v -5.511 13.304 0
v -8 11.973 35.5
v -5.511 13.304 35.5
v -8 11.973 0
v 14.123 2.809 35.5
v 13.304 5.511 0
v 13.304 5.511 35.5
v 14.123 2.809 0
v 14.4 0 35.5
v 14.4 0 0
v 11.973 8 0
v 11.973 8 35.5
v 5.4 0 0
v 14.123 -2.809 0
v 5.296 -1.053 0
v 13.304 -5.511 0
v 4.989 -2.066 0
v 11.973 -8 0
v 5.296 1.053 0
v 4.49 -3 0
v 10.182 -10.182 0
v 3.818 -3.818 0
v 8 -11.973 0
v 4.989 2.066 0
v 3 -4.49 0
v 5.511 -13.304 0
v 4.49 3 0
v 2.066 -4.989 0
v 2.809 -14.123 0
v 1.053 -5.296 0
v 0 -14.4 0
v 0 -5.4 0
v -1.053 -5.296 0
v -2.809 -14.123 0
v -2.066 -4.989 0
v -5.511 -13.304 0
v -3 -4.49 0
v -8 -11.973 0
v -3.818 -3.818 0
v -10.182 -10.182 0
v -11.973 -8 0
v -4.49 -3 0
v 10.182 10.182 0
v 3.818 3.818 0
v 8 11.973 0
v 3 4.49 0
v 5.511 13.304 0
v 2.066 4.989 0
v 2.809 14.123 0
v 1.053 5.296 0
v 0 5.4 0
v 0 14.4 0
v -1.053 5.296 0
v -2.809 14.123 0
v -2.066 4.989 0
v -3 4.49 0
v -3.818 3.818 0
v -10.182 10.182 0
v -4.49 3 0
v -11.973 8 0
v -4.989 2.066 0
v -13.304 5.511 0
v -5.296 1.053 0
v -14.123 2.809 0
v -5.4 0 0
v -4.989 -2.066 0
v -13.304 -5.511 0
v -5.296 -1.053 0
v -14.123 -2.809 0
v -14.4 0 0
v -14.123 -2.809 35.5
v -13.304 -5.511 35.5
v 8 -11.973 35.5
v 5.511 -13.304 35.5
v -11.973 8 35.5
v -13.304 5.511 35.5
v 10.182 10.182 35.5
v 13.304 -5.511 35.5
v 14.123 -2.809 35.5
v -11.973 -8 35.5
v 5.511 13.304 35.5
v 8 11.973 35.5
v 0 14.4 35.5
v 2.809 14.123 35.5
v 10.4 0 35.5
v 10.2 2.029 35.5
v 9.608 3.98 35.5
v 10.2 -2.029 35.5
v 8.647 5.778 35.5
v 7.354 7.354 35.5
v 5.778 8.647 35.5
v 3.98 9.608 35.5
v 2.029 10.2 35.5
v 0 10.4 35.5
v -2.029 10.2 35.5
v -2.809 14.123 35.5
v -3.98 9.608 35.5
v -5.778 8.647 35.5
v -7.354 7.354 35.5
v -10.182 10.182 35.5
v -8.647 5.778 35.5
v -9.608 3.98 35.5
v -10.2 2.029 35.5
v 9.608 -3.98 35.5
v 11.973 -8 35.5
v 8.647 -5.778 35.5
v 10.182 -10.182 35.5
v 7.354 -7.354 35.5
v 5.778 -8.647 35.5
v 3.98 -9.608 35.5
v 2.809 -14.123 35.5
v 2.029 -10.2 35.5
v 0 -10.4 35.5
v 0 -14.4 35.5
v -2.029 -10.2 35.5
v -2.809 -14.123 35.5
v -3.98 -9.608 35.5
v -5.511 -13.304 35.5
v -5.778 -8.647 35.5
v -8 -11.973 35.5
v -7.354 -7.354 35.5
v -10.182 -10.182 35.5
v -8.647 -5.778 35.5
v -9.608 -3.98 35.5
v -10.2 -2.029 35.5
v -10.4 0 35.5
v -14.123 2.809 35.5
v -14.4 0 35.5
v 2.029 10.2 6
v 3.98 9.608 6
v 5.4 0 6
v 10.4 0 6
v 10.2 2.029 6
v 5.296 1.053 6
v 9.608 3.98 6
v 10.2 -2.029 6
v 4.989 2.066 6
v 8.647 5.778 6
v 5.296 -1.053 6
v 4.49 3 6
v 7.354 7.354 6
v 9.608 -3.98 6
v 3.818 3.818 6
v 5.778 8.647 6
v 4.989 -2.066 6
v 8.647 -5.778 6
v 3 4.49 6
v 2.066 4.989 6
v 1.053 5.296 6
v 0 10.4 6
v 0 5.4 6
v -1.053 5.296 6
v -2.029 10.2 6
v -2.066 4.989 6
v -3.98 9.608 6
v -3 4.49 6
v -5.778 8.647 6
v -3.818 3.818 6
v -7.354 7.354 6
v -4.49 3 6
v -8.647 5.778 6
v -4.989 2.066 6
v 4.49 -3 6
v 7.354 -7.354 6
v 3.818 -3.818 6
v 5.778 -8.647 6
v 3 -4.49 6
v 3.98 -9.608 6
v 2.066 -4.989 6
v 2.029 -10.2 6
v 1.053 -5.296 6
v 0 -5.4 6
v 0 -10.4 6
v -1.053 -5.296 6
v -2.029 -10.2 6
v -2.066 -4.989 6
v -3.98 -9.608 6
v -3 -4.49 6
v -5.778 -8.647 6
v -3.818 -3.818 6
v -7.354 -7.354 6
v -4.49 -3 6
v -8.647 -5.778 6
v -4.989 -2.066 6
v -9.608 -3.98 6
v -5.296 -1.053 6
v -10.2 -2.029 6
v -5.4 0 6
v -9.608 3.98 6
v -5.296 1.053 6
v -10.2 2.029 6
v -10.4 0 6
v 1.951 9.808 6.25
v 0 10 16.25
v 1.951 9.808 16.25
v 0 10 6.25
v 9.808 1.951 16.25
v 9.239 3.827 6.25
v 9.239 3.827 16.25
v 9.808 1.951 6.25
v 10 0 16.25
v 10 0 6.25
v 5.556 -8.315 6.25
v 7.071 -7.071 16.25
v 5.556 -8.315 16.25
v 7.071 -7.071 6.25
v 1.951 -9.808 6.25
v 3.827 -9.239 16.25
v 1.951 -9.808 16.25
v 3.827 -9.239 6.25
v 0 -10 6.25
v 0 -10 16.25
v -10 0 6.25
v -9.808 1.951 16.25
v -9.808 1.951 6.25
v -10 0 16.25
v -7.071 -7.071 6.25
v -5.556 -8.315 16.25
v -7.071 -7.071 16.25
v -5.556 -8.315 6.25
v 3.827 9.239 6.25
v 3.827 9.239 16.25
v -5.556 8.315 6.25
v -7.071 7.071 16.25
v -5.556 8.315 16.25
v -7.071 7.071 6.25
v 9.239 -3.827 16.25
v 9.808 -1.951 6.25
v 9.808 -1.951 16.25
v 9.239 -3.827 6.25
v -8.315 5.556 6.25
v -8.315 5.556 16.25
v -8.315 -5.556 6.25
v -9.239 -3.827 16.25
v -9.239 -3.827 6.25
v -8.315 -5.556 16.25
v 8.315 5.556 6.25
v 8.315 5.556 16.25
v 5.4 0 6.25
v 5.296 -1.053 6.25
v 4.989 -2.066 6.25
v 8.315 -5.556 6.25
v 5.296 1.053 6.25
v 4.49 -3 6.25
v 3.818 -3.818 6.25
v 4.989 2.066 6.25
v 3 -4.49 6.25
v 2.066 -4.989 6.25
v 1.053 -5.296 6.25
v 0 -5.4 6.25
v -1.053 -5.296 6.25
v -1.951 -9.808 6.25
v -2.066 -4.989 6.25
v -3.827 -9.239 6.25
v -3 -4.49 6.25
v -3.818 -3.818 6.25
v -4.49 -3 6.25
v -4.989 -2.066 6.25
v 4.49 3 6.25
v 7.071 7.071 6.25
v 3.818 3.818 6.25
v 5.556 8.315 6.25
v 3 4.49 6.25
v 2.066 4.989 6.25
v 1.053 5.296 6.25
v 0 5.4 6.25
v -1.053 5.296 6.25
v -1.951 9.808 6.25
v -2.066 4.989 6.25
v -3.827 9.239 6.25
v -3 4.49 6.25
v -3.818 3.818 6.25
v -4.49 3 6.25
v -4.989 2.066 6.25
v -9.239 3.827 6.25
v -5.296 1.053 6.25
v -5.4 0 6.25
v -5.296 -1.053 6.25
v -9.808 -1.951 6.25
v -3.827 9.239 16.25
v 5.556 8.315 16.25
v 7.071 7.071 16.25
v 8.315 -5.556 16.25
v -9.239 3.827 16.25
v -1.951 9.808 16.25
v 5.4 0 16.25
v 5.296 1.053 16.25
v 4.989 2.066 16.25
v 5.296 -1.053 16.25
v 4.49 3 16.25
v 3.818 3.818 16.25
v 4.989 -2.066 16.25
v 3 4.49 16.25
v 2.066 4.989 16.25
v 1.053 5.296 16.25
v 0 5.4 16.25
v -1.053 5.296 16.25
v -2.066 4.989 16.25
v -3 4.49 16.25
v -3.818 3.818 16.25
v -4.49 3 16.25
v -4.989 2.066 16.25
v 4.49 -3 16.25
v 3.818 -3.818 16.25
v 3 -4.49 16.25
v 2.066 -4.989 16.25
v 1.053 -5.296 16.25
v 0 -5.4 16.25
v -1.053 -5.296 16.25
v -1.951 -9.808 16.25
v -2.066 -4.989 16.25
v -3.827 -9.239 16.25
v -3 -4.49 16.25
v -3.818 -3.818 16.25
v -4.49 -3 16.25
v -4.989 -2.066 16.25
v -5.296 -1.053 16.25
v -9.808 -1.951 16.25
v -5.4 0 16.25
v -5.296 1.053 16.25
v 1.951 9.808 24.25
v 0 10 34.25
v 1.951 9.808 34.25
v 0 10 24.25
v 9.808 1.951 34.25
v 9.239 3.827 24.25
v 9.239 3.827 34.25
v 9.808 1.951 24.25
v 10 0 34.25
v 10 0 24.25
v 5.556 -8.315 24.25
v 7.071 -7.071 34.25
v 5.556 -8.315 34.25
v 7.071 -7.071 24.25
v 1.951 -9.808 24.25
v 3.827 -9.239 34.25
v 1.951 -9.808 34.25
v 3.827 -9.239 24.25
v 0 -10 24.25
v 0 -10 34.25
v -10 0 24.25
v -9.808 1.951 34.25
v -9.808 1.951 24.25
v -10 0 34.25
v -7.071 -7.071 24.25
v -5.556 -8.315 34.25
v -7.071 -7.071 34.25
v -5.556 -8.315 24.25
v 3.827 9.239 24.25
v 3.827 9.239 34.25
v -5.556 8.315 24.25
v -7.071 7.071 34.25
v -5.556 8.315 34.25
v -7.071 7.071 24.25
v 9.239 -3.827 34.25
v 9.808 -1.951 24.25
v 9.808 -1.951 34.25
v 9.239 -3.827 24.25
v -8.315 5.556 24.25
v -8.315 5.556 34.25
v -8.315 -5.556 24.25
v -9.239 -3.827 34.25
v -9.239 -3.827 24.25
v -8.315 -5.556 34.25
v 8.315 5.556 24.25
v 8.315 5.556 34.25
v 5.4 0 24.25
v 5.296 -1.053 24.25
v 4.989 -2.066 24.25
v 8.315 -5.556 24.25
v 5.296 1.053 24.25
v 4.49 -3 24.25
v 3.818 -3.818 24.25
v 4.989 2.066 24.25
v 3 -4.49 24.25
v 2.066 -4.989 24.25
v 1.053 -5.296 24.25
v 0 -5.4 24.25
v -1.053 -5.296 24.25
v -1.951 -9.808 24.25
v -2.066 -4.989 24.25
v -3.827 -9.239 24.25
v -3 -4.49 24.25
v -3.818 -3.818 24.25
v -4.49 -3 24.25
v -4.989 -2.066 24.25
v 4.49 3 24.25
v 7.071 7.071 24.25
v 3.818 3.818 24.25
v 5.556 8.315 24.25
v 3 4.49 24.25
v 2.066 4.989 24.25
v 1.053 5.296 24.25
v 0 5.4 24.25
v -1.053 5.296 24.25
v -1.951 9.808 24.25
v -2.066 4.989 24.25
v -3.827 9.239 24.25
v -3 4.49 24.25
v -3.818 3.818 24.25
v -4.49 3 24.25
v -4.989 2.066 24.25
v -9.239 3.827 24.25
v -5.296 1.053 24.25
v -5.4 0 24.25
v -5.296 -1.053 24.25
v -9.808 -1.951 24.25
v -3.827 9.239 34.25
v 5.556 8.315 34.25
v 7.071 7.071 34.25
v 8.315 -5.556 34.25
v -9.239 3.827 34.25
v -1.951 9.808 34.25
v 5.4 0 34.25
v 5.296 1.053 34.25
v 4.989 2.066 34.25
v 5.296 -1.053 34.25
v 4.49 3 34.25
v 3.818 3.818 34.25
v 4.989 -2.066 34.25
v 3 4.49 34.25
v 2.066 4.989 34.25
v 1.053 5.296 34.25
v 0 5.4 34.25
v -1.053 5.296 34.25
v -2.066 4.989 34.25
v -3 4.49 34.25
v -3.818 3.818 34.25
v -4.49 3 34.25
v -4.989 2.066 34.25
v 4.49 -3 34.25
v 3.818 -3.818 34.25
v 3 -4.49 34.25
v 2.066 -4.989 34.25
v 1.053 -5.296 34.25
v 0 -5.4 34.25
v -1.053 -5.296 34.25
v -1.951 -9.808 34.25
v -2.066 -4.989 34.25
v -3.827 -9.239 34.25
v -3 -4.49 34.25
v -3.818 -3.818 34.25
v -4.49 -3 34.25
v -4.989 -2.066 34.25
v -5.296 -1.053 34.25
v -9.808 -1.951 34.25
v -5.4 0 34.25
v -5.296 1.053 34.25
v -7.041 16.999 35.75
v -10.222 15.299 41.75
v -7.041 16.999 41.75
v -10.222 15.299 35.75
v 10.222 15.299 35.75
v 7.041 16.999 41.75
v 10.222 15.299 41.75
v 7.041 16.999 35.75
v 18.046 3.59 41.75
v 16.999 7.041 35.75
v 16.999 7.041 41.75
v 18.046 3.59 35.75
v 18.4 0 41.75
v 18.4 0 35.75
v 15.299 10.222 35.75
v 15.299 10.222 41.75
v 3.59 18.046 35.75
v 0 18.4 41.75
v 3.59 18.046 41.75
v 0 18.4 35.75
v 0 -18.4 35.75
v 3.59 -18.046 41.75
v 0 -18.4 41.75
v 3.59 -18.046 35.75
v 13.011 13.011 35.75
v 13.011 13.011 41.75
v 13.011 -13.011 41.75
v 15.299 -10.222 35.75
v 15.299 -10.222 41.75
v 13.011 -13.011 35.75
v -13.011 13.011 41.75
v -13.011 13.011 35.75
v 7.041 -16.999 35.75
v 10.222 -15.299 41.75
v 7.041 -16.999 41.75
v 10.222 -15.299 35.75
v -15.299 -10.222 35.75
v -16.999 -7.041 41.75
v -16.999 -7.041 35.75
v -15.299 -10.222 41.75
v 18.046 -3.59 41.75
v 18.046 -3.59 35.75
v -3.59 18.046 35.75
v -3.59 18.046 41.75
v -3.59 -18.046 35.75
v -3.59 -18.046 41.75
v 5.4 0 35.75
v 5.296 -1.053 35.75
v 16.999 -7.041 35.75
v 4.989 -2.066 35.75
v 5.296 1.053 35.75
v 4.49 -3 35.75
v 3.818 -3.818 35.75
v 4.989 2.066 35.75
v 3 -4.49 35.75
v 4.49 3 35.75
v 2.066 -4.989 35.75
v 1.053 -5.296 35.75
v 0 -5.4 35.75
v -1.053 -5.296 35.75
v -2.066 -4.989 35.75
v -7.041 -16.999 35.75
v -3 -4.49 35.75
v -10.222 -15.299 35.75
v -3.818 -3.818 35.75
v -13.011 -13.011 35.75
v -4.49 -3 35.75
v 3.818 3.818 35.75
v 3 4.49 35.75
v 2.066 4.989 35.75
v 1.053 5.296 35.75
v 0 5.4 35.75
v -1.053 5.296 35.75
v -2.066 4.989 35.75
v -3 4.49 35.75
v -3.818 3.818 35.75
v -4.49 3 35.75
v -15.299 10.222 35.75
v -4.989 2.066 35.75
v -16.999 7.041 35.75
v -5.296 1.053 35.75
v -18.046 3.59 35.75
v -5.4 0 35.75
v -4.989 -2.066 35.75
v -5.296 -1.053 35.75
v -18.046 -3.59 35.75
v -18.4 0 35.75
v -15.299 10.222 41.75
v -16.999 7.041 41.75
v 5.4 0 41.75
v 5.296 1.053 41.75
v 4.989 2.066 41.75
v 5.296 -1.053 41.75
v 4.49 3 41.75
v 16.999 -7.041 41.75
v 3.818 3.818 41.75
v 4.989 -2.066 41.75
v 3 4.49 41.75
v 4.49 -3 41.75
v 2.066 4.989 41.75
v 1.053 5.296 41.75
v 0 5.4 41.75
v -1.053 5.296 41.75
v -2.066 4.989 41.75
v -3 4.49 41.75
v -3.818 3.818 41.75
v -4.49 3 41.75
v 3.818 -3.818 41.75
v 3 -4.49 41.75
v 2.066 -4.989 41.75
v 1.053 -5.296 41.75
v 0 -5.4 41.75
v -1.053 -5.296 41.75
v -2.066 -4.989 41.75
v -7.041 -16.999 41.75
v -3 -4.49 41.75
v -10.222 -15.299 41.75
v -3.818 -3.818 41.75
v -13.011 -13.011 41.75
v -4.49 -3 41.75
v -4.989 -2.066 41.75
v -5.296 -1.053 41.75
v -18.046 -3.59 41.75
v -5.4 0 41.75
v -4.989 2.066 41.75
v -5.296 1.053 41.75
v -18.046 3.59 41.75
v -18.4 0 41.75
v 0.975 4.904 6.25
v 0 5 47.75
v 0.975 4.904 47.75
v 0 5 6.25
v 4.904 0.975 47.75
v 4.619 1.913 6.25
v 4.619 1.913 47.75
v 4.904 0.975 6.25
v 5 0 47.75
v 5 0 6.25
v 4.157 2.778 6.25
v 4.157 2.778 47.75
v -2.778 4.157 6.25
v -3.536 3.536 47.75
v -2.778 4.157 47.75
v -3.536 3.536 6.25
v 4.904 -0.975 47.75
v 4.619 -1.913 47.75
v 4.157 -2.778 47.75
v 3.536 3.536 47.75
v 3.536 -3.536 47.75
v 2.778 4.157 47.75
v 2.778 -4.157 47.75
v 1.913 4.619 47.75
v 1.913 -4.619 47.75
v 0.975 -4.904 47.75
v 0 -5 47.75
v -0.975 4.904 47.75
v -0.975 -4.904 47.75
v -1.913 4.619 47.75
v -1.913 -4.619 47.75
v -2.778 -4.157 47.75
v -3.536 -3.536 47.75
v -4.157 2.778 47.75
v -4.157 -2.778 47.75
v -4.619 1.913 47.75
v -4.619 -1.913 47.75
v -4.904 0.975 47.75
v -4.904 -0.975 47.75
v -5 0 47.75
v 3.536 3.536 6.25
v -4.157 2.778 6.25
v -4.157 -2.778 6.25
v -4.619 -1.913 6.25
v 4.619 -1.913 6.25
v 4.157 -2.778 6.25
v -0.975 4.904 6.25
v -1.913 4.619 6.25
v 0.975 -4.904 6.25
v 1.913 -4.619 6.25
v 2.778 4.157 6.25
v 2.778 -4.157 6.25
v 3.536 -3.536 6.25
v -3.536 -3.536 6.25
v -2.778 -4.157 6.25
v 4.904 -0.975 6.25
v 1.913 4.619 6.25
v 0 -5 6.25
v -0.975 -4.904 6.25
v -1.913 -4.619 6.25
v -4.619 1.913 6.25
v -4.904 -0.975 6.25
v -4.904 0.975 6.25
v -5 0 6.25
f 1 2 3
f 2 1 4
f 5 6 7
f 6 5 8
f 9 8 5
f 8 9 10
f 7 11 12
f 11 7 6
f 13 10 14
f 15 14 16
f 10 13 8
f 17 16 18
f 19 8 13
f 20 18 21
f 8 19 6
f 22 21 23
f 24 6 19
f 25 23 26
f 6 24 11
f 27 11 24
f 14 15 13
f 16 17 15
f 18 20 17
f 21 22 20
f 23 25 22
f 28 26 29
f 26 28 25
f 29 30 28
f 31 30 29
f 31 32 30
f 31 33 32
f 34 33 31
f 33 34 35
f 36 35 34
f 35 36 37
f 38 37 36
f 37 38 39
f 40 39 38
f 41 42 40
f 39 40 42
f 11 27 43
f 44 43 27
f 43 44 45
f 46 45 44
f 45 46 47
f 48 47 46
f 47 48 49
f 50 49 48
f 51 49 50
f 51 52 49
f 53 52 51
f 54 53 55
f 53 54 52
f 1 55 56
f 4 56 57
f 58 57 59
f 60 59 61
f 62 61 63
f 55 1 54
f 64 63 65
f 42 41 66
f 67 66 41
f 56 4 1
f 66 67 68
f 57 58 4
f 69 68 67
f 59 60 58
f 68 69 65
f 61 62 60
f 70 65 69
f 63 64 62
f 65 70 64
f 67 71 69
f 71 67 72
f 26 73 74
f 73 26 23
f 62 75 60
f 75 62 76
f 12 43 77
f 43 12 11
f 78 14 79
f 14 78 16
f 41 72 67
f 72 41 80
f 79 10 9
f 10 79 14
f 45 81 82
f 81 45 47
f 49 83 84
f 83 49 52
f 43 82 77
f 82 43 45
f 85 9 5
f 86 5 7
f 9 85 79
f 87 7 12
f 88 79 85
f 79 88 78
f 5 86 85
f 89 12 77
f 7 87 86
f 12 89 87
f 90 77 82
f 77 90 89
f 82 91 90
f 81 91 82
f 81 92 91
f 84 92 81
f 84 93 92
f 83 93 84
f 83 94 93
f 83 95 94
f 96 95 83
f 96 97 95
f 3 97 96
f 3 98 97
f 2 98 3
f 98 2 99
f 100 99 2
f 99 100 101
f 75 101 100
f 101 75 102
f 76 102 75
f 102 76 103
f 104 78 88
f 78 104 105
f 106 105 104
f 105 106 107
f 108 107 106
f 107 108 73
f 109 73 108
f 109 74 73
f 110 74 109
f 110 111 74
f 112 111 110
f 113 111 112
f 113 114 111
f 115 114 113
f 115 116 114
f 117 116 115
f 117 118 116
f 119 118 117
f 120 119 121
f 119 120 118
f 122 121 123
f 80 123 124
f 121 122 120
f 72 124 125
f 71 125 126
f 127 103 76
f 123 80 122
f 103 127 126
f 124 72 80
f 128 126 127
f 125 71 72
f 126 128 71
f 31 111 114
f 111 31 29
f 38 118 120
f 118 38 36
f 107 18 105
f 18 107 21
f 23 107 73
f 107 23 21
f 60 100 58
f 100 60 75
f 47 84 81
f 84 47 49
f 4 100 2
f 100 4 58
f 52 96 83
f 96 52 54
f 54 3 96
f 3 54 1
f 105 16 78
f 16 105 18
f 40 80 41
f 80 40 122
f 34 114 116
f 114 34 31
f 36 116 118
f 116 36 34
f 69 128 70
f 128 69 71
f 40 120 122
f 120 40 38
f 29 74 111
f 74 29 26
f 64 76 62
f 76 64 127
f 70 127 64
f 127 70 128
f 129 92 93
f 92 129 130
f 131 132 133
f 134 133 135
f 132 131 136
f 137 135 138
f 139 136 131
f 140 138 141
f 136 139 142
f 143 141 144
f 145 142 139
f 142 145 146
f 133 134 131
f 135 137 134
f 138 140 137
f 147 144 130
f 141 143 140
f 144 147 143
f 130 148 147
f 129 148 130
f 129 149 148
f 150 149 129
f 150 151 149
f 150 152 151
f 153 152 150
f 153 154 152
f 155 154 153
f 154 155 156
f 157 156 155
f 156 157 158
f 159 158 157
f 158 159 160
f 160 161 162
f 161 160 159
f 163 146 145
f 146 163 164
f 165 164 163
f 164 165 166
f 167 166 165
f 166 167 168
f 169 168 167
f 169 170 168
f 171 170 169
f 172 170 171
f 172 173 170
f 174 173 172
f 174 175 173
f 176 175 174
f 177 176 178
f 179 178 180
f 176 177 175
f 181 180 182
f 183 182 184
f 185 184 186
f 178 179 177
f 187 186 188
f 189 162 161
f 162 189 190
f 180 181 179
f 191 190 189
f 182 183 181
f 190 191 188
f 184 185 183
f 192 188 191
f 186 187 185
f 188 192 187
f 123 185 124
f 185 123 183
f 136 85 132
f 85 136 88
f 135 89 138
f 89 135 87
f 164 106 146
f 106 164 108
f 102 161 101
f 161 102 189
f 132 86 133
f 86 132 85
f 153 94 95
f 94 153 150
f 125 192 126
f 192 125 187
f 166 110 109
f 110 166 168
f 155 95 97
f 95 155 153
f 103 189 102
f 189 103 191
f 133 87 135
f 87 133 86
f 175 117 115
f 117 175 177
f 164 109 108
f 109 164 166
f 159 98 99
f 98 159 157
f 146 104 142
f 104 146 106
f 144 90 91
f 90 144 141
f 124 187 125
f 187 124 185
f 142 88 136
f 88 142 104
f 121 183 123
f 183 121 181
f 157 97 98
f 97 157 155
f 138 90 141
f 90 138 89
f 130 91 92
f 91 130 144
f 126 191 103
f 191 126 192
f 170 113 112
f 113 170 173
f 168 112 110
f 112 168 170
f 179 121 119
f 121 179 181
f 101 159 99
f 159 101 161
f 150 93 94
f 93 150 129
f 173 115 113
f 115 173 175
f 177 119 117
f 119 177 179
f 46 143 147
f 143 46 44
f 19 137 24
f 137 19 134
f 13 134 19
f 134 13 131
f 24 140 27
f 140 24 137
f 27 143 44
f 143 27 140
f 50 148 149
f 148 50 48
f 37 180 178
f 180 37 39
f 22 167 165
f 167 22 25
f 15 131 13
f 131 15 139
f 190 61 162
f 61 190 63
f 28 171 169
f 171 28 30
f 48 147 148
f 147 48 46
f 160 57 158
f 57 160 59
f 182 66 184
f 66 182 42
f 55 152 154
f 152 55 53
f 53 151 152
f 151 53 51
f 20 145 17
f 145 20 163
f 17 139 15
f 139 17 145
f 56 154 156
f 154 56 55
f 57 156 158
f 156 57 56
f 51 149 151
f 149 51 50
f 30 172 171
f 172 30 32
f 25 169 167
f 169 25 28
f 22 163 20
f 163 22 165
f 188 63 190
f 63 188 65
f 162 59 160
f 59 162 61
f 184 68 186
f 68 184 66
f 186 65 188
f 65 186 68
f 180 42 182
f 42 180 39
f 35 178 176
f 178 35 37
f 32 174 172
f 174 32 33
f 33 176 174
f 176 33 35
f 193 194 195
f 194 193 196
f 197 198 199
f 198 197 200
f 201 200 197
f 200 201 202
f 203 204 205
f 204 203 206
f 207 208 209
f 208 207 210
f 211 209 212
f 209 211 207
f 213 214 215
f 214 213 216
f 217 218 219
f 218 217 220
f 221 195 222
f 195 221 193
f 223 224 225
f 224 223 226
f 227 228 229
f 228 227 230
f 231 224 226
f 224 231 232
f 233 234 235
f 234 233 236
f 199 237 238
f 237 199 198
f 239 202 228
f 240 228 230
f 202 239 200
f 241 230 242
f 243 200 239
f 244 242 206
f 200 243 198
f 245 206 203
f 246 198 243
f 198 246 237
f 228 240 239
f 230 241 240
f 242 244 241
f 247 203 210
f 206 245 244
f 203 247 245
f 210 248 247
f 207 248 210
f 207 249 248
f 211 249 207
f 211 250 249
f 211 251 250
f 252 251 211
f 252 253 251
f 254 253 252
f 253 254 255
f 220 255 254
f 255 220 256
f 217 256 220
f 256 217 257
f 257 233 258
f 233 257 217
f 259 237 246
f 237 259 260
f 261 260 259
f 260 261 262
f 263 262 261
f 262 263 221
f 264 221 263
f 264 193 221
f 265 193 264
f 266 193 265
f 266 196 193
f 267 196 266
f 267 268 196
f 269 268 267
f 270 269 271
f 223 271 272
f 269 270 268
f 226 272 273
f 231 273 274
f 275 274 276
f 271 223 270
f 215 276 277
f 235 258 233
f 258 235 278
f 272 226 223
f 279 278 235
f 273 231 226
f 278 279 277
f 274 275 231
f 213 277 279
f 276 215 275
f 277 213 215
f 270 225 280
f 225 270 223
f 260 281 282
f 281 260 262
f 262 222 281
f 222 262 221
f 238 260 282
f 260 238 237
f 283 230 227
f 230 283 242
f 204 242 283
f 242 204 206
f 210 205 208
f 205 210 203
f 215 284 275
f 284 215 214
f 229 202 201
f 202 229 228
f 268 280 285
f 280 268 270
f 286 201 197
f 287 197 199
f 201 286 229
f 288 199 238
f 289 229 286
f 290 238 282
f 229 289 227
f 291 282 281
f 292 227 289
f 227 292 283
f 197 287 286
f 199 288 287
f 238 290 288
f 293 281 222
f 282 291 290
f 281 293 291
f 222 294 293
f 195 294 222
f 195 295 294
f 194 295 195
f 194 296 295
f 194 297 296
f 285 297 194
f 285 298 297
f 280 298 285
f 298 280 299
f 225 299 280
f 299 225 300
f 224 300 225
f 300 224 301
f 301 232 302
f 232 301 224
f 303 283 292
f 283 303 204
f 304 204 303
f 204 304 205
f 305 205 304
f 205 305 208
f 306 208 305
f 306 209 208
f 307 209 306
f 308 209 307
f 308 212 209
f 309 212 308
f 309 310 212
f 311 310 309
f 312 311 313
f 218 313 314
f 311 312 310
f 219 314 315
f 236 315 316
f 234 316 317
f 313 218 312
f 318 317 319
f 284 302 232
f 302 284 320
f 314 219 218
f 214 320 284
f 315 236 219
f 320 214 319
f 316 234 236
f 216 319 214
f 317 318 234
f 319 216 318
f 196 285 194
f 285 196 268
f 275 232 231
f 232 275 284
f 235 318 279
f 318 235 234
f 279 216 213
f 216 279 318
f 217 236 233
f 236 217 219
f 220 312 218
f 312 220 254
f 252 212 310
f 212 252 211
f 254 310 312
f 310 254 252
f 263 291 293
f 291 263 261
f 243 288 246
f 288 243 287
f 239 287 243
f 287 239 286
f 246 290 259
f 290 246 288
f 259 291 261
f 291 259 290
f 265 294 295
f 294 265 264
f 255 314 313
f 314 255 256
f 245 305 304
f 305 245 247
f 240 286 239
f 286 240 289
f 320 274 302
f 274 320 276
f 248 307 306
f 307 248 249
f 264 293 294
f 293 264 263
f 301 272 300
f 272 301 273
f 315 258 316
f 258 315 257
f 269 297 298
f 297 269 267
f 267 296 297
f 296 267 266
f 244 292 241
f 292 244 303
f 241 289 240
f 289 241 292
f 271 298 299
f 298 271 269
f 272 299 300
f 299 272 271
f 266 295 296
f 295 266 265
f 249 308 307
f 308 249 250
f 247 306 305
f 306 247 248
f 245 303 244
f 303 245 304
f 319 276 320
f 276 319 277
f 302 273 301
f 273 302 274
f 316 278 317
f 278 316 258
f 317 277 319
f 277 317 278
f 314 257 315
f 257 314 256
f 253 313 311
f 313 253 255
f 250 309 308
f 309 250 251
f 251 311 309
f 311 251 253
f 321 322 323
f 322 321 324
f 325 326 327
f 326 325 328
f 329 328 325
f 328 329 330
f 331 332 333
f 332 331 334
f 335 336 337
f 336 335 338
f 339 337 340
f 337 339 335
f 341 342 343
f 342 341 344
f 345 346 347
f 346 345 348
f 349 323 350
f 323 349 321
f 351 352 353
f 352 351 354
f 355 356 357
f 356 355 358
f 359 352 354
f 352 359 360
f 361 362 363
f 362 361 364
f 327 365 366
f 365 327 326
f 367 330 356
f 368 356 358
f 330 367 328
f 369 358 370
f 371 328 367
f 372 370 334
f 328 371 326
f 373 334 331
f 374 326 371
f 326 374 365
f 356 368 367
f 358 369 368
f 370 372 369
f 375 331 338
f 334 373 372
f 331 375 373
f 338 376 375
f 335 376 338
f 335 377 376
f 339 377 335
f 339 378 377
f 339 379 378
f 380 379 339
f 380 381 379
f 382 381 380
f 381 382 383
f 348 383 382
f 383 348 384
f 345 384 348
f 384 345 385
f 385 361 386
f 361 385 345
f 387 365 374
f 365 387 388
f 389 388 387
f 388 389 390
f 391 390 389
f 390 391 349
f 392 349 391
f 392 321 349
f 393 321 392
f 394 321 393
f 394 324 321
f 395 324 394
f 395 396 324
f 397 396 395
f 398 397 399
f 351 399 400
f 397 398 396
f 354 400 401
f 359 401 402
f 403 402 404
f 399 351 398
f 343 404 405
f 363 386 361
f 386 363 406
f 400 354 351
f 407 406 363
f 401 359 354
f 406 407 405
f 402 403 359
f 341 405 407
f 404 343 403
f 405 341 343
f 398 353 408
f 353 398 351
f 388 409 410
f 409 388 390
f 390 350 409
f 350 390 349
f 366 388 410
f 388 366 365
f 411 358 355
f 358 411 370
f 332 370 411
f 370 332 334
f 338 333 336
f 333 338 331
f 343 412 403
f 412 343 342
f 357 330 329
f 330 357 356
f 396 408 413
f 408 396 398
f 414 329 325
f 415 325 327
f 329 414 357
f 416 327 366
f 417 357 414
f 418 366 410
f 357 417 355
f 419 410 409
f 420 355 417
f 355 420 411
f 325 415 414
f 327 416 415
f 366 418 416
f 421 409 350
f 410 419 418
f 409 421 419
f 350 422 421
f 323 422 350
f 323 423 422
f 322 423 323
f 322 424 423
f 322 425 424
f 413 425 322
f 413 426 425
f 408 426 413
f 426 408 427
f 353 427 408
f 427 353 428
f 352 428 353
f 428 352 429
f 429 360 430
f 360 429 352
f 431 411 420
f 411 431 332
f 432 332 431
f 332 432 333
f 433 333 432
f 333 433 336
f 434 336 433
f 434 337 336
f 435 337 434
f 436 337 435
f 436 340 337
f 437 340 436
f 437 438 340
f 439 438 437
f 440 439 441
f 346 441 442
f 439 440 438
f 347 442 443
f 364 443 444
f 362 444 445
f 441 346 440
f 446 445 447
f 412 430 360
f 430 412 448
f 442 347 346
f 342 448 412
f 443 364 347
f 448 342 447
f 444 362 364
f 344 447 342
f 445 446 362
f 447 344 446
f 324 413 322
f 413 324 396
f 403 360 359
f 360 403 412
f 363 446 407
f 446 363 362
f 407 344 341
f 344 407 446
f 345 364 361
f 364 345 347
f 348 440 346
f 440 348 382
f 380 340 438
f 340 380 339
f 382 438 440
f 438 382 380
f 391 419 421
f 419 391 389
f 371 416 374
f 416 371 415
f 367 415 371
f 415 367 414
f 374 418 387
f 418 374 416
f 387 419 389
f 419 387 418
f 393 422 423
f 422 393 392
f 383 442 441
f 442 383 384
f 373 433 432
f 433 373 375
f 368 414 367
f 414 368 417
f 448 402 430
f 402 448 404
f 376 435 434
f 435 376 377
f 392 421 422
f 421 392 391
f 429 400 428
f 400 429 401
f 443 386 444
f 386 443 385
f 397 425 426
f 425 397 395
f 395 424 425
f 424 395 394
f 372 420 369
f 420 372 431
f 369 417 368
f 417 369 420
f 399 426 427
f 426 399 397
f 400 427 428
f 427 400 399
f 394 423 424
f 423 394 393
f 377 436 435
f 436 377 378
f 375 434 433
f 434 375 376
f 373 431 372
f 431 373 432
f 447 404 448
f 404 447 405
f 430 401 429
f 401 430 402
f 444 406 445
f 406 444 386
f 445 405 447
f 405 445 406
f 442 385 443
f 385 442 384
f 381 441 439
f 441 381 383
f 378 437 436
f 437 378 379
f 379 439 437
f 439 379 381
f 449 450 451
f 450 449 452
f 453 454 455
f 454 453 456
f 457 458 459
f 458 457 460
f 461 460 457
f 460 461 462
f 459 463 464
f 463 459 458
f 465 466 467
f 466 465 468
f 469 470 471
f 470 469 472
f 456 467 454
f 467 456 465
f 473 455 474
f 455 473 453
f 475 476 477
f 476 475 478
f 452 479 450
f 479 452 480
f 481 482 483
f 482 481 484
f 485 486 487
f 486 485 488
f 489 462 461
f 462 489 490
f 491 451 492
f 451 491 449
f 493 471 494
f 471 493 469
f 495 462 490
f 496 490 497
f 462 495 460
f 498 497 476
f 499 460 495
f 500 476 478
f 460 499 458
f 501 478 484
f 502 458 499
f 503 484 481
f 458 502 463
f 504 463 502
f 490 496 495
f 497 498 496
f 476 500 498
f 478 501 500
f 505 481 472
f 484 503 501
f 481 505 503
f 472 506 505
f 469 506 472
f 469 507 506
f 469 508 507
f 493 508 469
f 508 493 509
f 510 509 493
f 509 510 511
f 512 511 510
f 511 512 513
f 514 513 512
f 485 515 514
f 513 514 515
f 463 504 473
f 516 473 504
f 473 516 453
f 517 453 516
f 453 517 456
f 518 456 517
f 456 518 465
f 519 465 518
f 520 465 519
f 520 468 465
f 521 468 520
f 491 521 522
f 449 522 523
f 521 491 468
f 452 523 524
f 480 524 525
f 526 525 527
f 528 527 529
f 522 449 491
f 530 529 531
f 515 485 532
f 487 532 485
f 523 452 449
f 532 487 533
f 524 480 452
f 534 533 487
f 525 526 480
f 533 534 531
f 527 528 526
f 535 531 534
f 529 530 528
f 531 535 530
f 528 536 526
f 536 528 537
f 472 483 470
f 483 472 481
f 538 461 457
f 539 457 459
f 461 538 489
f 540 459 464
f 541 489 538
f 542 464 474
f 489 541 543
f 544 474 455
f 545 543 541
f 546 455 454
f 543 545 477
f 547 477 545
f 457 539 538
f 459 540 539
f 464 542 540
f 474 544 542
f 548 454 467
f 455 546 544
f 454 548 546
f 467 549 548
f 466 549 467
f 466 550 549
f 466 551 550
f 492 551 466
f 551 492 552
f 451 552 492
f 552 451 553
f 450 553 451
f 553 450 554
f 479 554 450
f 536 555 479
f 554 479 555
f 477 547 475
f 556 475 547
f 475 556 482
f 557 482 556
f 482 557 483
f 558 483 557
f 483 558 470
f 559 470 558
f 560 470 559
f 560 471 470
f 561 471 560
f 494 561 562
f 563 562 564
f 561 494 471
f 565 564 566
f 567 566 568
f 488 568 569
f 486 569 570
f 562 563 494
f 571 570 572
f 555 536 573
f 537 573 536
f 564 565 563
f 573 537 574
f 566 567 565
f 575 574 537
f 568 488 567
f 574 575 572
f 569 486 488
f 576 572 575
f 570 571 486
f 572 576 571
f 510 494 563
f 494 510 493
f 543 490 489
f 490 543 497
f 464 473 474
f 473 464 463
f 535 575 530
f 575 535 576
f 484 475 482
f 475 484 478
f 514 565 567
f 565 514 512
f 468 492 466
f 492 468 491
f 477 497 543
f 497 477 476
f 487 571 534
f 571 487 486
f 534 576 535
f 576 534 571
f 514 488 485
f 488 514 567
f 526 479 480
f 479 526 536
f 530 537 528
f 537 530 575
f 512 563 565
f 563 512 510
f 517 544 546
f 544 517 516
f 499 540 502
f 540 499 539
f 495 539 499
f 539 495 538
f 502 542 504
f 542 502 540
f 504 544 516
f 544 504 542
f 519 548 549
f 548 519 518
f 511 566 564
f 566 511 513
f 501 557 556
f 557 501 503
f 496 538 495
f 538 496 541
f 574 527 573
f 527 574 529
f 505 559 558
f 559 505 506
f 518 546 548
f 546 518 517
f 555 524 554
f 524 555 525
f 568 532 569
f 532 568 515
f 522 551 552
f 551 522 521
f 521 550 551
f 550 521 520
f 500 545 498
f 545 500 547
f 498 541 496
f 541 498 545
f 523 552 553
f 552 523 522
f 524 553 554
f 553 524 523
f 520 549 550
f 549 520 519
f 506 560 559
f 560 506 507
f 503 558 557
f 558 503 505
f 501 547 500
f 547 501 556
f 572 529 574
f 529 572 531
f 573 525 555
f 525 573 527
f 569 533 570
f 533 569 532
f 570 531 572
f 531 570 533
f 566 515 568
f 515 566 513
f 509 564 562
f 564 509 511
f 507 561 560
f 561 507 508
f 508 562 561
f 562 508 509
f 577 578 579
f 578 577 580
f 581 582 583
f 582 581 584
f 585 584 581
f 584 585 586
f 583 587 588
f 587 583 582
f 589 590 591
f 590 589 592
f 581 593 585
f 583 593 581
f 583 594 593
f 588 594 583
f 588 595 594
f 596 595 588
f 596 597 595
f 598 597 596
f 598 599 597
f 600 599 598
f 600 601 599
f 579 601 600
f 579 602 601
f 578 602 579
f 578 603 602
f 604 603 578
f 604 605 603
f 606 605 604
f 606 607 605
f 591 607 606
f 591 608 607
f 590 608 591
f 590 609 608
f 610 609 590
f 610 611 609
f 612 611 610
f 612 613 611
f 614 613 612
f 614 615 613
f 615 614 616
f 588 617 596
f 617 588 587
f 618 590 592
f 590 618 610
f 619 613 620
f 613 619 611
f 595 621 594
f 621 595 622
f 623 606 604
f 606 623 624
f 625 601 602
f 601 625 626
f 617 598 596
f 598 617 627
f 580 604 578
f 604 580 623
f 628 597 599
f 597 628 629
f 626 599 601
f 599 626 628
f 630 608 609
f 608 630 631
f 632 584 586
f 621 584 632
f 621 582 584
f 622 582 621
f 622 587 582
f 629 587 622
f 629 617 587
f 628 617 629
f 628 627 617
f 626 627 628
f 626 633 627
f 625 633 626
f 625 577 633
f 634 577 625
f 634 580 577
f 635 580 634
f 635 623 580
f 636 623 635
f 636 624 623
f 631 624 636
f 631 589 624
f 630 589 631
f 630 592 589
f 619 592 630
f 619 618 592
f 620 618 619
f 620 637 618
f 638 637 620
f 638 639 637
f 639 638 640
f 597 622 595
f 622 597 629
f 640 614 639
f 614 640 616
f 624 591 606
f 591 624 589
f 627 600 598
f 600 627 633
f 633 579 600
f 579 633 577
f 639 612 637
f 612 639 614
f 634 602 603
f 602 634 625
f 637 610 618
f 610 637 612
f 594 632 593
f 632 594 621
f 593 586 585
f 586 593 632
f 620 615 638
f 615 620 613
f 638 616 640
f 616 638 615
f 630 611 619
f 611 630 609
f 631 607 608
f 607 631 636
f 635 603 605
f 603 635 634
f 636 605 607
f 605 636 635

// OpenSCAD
$fn = 32;

// ------------------------------------------------------------------------
// Shaft station: cup d28.8 x 35.5 mm, shaft d10
// Every part is its own module, assembly() places every instance.
// ------------------------------------------------------------------------

// --- part 1 ---
module housing_cup() {
  difference() {
    cylinder(h = 35.5, d = 28.8);
    translate([0, 0, 6]) cylinder(h = 30.5, d = 20.8);
    translate([0, 0, -1]) cylinder(h = 8, d = 10.8);
  }
}

// --- part 2 ---
module bearing_lower() {
  difference() {
      translate([0, 0, 0]) cylinder(h = 10, d = 20);
      translate([0, 0, -1]) cylinder(h = 12, d = 10.8);
    }
}

// --- part 3 ---
module bearing_upper() {
  difference() {
      translate([0, 0, 0]) cylinder(h = 10, d = 20);
      translate([0, 0, -1]) cylinder(h = 12, d = 10.8);
    }
}

// --- part 4 ---
module station_shaft() {
  translate([0, 0, -20.75]) cylinder(h = 41.5, d = 10);
}

// --- part 5 ---
module station_cover() {
  difference() {
    cylinder(h = 6, d = 36.8);
    translate([0, 0, -1]) cylinder(h = 8, d = 10.8);
  }
}

// --- assembly ---
module assembly() {
  color([0.80, 0.24, 0.20]) translate([0, 0, 0]) rotate([0, 0, 0]) housing_cup();
  color([0.20, 0.45, 0.75]) translate([0, 0, 6.25]) rotate([0, 0, 0]) bearing_lower();
  color([0.25, 0.62, 0.32]) translate([0, 0, 24.25]) rotate([0, 0, 0]) bearing_upper();
  color([0.92, 0.70, 0.18]) translate([0, 0, 27]) rotate([0, 0, 0]) station_shaft();
  color([0.58, 0.35, 0.70]) translate([0, 0, 35.75]) rotate([0, 0, 0]) station_cover();
}

assembly();
